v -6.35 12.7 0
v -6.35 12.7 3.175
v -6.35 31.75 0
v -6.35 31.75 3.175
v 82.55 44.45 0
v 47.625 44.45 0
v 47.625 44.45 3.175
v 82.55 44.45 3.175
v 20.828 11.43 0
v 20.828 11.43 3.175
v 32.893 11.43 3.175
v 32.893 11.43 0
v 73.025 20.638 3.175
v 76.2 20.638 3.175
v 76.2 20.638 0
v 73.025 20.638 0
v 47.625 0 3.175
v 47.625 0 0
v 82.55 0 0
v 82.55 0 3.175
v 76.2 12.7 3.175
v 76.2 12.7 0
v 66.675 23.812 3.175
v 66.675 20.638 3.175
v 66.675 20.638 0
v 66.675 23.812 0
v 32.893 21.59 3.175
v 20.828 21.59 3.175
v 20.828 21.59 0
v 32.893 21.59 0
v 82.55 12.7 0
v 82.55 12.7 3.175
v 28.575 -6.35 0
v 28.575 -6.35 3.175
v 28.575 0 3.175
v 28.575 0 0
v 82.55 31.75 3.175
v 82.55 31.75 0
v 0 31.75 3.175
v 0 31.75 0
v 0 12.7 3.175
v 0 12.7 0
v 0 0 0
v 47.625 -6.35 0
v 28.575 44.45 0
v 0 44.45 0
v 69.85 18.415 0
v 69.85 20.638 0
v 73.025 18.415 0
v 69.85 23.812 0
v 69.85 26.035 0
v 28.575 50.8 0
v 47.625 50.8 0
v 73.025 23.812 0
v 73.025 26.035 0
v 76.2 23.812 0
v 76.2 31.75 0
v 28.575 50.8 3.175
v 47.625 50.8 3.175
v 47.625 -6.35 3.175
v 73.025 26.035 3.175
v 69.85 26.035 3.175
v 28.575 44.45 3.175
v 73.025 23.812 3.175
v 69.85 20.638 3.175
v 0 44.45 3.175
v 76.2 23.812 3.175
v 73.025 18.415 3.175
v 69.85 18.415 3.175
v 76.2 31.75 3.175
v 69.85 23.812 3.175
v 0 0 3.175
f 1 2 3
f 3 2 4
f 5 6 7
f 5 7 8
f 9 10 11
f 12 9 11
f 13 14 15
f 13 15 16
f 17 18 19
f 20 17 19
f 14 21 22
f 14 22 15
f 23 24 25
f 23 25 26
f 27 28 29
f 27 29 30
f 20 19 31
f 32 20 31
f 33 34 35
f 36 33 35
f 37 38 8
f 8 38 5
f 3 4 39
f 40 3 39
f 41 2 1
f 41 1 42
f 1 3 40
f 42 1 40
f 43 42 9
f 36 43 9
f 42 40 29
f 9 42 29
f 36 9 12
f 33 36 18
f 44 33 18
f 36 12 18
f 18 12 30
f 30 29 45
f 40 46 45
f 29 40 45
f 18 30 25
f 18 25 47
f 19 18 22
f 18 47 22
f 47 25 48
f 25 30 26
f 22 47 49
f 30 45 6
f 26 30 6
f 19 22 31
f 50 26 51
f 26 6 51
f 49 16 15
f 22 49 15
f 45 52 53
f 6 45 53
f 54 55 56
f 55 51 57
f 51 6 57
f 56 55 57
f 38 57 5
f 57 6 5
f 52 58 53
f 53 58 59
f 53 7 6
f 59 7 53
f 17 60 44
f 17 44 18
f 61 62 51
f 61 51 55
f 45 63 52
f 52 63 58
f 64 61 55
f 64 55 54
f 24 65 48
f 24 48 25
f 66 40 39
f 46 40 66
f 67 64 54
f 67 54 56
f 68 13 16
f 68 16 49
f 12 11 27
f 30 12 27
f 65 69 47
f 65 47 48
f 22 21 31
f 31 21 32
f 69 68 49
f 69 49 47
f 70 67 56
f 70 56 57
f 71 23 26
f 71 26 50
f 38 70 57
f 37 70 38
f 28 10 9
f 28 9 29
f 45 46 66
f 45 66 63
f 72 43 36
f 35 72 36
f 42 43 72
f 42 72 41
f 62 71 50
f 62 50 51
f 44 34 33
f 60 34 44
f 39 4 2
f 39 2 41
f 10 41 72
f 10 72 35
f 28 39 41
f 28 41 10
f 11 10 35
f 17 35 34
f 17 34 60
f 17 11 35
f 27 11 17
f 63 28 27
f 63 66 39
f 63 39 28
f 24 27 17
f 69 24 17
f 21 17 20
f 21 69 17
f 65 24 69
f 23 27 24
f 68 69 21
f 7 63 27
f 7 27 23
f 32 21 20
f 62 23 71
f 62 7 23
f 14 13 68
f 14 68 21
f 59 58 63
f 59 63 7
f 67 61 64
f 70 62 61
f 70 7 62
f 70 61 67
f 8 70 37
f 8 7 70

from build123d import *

# Parameters (mm, degrees)
SKETCH1_W           = 82.55
SKETCH1_H           = 44.45
BOSS_EXTRUDE1_DEPTH = 3.175
SKETCH2_W           = 6.35
SKETCH2_H           = 19.05
BOSS_EXTRUDE2_DEPTH = 3.175
SKETCH5_W           = 19.05
SKETCH5_H           = 6.35
BOSS_EXTRUDE3_DEPTH = 3.175
SKETCH3_W           = 6.35
SKETCH3_H           = 19.05
CUT_EXTRUDE1_DEPTH  = 3.175
SKETCH6_W           = 12.065
SKETCH6_H           = 10.16
CUT_EXTRUDE2_DEPTH  = 97.980529618
CUT_EXTRUDE3_DEPTH  = 97.980529618


with BuildPart() as part:
    # Sketch1 → Boss-Extrude1 (new body)
    with BuildSketch(Plane.XY):
        with Locations((41.275, 22.225)):
            Rectangle(SKETCH1_W, SKETCH1_H)
    extrude(amount=BOSS_EXTRUDE1_DEPTH)

    # Sketch2 → Boss-Extrude2 (add)
    with BuildSketch(Plane.XY.offset(3.175)):
        with Locations((-3.175, 22.225)):
            Rectangle(SKETCH2_W, SKETCH2_H)
    extrude(amount=-BOSS_EXTRUDE2_DEPTH)

    # Sketch5 → Boss-Extrude3 (add)
    with BuildSketch(Plane.XY.offset(3.175)):
        with Locations((38.1, 47.625)):
            Rectangle(SKETCH5_W, SKETCH5_H)
        with Locations((38.1, -3.175)):
            Rectangle(SKETCH5_W, SKETCH5_H)
    extrude(amount=-BOSS_EXTRUDE3_DEPTH)

    # Sketch3 → Cut-Extrude1 (cut)
    with BuildSketch(Plane.XY.offset(3.175)):
        with Locations((79.375, 22.225)):
            Rectangle(SKETCH3_W, SKETCH3_H)
    extrude(amount=-CUT_EXTRUDE1_DEPTH, mode=Mode.SUBTRACT)

    # Sketch6 → Cut-Extrude2 (cut, through all)
    with BuildSketch(Plane.XY.offset(3.175)):
        with Locations((26.8605, 16.51)):
            Rectangle(SKETCH6_W, SKETCH6_H)
    extrude(amount=-CUT_EXTRUDE2_DEPTH, mode=Mode.SUBTRACT)

    # Sketch7 → Cut-Extrude3 (cut, through all)
    with BuildSketch(Plane.XY.offset(3.175)):
        Polygon((69.85, 26.035), (73.025, 26.035), (73.025, 23.8125), (76.2, 23.8125), (76.2, 20.6375), (73.025, 20.6375), (73.025, 18.415), (69.85, 18.415), (69.85, 20.6375), (66.675, 20.6375), (66.675, 23.8125), (69.85, 23.8125), align=None)
    extrude(amount=-CUT_EXTRUDE3_DEPTH, mode=Mode.SUBTRACT)


solid = part.part
